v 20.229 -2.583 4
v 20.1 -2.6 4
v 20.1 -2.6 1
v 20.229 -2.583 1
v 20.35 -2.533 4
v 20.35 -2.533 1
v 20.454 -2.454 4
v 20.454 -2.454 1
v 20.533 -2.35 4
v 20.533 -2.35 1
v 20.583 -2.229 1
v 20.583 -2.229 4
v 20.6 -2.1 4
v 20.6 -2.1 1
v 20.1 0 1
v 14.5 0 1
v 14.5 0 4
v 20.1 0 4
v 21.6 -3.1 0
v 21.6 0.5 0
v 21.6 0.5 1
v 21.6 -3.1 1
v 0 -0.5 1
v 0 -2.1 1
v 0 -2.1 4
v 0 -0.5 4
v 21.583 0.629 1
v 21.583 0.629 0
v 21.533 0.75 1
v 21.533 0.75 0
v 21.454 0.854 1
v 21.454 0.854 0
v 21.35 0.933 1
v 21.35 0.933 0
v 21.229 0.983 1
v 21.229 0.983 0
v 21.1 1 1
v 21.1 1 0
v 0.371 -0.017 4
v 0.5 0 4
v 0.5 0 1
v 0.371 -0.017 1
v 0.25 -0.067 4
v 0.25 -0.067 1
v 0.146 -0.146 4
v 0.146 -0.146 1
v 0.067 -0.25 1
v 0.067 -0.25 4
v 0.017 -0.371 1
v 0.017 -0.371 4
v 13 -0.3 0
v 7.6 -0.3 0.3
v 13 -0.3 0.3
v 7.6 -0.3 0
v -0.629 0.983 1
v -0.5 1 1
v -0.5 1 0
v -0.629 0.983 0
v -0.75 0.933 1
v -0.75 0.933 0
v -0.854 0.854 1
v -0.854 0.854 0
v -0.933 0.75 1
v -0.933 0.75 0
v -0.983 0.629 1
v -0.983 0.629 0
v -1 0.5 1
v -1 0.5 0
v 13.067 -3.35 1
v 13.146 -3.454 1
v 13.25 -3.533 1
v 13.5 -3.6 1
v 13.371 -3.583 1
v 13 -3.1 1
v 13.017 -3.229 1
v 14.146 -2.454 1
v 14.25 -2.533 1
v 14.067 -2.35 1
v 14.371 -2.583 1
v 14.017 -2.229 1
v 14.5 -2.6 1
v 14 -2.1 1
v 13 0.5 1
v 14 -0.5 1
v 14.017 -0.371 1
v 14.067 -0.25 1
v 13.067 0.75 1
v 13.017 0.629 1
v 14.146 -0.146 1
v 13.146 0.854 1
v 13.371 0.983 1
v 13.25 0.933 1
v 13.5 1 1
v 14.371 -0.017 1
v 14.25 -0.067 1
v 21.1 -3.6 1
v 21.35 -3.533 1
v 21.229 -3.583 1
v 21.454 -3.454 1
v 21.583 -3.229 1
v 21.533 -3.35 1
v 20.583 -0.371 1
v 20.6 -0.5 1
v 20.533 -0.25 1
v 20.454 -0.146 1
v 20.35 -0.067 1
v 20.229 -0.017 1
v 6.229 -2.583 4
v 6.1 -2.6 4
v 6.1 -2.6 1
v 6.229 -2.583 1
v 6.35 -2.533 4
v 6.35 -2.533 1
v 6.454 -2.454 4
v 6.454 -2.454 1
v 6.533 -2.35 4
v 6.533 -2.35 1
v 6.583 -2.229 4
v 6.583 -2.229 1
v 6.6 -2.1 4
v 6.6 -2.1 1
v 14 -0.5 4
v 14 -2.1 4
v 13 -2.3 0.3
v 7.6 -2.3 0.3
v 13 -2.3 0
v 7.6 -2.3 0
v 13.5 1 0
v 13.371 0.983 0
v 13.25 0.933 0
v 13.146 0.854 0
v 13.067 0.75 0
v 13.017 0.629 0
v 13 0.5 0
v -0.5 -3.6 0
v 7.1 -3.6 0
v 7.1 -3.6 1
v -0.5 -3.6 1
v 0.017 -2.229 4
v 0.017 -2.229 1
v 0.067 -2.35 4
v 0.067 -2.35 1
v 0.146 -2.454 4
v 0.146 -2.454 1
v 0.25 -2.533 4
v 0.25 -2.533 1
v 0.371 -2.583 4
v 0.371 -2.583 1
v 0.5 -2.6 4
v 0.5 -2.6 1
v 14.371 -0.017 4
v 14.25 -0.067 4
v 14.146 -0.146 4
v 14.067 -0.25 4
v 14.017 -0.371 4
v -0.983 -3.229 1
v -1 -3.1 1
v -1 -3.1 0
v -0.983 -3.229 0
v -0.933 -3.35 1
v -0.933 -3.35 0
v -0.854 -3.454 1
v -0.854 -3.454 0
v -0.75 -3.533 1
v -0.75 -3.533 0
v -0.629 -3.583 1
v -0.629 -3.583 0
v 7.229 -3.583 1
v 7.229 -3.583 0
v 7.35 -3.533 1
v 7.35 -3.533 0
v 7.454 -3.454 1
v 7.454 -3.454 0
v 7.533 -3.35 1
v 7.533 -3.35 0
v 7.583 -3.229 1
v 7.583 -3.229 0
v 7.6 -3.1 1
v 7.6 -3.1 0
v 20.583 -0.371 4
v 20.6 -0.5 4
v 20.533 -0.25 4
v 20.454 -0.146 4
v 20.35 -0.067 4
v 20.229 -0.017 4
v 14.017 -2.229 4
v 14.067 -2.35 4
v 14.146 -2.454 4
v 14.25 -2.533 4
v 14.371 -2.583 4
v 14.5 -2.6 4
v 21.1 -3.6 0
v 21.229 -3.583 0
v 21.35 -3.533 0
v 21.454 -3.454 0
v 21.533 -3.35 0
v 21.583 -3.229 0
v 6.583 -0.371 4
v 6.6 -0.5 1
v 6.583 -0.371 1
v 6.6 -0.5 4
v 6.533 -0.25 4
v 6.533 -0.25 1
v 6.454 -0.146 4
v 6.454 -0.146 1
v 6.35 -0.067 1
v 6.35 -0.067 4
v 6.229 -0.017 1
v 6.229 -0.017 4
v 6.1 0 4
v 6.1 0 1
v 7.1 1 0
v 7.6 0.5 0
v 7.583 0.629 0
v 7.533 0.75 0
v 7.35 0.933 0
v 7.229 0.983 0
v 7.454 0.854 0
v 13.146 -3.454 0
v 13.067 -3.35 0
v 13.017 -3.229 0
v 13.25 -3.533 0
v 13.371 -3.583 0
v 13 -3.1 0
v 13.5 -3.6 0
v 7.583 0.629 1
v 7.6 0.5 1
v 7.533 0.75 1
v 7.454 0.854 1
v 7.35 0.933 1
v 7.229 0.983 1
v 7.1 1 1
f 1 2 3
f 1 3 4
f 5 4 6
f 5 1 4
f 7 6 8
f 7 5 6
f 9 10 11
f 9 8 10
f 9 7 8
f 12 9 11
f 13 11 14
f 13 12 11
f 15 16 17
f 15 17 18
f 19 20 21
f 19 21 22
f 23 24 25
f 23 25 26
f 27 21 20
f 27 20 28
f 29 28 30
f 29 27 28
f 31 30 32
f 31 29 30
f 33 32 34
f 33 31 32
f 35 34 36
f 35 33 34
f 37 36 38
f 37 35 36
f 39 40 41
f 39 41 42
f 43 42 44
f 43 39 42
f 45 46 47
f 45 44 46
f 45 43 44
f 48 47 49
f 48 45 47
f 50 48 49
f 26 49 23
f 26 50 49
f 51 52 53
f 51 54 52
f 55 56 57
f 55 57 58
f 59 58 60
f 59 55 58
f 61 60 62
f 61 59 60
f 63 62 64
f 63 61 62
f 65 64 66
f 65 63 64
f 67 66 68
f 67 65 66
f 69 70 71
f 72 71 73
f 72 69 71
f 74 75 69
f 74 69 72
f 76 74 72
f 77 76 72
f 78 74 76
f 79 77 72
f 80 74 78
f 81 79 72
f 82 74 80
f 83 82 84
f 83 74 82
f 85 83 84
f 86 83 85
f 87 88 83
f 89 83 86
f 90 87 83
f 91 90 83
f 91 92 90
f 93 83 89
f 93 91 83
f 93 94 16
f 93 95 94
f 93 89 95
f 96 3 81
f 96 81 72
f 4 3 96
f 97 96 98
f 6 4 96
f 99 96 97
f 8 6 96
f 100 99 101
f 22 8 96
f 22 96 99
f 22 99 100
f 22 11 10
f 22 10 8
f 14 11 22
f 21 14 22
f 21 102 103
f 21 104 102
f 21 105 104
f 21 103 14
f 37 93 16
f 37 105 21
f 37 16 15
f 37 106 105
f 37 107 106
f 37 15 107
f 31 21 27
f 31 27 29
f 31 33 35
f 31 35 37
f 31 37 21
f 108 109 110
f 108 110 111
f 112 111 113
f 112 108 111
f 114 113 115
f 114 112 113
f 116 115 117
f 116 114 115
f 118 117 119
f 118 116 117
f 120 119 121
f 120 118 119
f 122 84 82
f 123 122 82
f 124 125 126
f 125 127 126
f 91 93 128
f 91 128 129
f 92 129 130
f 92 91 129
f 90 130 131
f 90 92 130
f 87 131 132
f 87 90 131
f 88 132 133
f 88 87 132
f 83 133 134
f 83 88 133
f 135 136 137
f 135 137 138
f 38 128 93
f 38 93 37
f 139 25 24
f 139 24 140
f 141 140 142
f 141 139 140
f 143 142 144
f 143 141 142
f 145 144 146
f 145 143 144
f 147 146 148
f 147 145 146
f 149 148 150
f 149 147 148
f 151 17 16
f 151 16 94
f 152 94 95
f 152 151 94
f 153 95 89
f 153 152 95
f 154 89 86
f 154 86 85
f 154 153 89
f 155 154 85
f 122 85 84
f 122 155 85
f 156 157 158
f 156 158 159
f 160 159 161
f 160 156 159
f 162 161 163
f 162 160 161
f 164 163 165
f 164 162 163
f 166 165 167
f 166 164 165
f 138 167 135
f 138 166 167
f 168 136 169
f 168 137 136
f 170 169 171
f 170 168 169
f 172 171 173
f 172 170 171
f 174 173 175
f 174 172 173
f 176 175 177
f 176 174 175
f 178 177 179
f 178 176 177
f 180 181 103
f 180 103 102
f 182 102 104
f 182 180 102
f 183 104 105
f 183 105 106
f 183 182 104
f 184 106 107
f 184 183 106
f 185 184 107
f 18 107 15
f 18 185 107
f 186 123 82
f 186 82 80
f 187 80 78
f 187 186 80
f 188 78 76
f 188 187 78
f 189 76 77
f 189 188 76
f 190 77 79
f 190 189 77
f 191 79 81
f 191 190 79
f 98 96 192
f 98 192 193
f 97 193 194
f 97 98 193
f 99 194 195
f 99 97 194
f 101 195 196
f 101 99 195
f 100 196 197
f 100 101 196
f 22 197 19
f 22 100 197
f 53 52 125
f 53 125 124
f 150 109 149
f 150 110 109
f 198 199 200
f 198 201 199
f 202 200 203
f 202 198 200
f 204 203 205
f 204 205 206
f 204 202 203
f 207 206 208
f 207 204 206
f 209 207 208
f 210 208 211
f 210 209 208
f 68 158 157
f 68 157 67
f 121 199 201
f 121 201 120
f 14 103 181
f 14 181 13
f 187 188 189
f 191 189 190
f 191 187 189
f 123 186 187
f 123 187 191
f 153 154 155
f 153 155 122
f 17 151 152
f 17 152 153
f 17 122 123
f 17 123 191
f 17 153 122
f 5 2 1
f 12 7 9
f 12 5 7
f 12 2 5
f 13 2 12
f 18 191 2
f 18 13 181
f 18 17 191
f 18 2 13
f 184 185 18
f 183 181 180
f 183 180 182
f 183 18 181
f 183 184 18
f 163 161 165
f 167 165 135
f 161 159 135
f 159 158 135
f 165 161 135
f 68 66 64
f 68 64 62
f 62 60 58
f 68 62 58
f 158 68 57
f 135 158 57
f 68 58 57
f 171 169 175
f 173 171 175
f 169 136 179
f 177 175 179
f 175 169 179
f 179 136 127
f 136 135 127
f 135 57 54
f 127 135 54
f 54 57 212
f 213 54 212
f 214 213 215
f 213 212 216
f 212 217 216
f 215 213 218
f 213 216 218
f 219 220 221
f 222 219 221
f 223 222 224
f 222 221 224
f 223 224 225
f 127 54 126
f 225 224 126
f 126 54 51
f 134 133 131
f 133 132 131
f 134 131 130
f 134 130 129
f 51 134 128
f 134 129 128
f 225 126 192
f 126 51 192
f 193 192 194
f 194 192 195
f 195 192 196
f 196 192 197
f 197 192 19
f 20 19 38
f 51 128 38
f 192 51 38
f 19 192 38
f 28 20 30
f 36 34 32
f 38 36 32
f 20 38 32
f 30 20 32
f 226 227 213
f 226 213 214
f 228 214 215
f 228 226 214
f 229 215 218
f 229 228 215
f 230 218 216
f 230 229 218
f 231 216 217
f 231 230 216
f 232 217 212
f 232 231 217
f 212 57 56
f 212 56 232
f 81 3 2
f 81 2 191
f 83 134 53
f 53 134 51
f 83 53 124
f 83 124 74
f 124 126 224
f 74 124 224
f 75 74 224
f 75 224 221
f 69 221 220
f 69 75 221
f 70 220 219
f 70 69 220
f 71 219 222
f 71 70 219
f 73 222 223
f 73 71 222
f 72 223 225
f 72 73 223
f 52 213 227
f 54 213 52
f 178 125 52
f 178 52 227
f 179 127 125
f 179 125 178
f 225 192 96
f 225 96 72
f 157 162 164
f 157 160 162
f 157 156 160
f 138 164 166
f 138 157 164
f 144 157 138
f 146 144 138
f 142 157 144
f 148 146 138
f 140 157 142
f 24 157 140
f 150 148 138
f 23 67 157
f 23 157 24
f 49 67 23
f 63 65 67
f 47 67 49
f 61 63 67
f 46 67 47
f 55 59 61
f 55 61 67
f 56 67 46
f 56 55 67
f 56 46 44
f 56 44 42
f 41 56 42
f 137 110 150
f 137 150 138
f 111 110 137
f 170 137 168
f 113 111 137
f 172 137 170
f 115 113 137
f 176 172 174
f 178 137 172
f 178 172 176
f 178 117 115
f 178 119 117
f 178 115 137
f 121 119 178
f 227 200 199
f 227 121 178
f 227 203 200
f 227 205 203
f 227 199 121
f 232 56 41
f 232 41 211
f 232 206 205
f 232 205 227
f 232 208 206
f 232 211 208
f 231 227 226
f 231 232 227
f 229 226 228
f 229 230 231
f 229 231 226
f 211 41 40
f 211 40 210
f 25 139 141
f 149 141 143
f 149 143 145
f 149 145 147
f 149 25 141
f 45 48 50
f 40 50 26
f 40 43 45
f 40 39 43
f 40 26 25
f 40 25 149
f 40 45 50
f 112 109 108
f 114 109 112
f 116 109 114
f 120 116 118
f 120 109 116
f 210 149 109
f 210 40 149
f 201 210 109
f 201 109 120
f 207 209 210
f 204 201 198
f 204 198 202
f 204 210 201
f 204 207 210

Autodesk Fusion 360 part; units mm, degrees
sketch "草图1" plane through (0, 0, 0) normal (0, 0, 1) x (1, 0, 0)
  line L0 (20.6, 0) -> (20.6, -2.6)
  line L1 (0, -2.6) -> (0, 0)
  line L2 (6.6, 0) -> (6.6, -2.6)
  line L3 (14, 0) -> (14, -2.6)
  line L4 (0, 0) -> (6.6, 0)
  line L5 (14, 0) -> (20.6, 0)
  line L6 (20.6, -2.6) -> (14, -2.6)
  line L7 (6.6, -2.6) -> (0, -2.6)
  line L8 (7.6, -3.6) -> (-1, -3.6)
  line L9 (-1, -3.6) -> (-1, 1)
  line L10 (-1, 1) -> (7.6, 1)
  line L11 (7.6, 1) -> (7.6, -3.6)
  line L12 (21.6, -3.6) -> (13, -3.6)
  line L13 (13, 1) -> (13, -3.6)
  line L14 (13, 1) -> (21.6, 1)
  line L15 (21.6, 1) -> (21.6, -3.6)
  line L16 (7.6, -0.3) -> (13, -0.3)
  line L17 (7.6, -2.3) -> (13, -2.3)
  dimension "d2" = 2.6
  dimension "d3" = 6.6
  dimension "d4" = 6.6
  dimension "d7" = -1
  dimension "d8" = -1
  dimension "d9" = 2
  dimension "d10" = 0.3
  dimension "d19" = 5.4
extrude "拉伸1" add sketch "草图1" along normal blind 1 contours L0 L3 L5 L6 | L1 L2 L4 L7 | L8 L9 L10 L11 | L12 L13 L14 L15 makes body 1 at (1.8667, -0.5333, 0) makes body 2 at (15.8667, -0.5333, 0)
extrude "拉伸2" add sketch "草图1" along normal blind 0.3 contours L11 L13 L16 L17 bodies 1 2
extrude "拉伸3" add sketch "草图1" along normal blind 4 contours L0 L3 L5 L6 | L1 L2 L4 L7 bodies 1
fillet "圆角1" radius 0.5 16 edges at (6.6, -2.6, 2.5) (6.6, 0, 2.5) (0, 0, 2.5) (0, -2.6, 2.5) (-1, -3.6, 0.5) (-1, 1, 0.5) (7.6, 1, 0.5) (7.6, -3.6, 0.5) (14, -2.6, 2.5) (13, -3.6, 0.5) (13, 1, 0.5) (21.6, -3.6, 0.5) (21.6, 1, 0.5) (20.6, 0, 2.5) (20.6, -2.6, 2.5) (14, 0, 2.5) on bodies 1
